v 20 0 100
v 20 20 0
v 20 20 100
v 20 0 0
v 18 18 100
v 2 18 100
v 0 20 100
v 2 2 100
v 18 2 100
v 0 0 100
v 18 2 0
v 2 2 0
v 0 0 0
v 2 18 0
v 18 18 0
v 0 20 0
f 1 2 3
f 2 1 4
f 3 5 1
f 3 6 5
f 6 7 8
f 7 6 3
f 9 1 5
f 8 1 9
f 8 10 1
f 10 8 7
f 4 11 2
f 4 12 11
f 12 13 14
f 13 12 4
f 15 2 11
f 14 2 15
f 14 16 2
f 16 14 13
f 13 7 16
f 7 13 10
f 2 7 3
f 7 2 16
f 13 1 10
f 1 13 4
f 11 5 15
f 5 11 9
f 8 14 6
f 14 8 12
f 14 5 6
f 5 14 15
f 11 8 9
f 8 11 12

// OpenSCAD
$fn = 64;

outer_w = 20;
outer_h = 20;
wall = 2;
length = 100;

inner_w = outer_w - 2*wall;
inner_h = outer_h - 2*wall;

difference() {
    cube([outer_w, outer_h, length], center=false);
    translate([wall, wall, -0.1])
        cube([inner_w, inner_h, length + 0.2], center=false);
}
